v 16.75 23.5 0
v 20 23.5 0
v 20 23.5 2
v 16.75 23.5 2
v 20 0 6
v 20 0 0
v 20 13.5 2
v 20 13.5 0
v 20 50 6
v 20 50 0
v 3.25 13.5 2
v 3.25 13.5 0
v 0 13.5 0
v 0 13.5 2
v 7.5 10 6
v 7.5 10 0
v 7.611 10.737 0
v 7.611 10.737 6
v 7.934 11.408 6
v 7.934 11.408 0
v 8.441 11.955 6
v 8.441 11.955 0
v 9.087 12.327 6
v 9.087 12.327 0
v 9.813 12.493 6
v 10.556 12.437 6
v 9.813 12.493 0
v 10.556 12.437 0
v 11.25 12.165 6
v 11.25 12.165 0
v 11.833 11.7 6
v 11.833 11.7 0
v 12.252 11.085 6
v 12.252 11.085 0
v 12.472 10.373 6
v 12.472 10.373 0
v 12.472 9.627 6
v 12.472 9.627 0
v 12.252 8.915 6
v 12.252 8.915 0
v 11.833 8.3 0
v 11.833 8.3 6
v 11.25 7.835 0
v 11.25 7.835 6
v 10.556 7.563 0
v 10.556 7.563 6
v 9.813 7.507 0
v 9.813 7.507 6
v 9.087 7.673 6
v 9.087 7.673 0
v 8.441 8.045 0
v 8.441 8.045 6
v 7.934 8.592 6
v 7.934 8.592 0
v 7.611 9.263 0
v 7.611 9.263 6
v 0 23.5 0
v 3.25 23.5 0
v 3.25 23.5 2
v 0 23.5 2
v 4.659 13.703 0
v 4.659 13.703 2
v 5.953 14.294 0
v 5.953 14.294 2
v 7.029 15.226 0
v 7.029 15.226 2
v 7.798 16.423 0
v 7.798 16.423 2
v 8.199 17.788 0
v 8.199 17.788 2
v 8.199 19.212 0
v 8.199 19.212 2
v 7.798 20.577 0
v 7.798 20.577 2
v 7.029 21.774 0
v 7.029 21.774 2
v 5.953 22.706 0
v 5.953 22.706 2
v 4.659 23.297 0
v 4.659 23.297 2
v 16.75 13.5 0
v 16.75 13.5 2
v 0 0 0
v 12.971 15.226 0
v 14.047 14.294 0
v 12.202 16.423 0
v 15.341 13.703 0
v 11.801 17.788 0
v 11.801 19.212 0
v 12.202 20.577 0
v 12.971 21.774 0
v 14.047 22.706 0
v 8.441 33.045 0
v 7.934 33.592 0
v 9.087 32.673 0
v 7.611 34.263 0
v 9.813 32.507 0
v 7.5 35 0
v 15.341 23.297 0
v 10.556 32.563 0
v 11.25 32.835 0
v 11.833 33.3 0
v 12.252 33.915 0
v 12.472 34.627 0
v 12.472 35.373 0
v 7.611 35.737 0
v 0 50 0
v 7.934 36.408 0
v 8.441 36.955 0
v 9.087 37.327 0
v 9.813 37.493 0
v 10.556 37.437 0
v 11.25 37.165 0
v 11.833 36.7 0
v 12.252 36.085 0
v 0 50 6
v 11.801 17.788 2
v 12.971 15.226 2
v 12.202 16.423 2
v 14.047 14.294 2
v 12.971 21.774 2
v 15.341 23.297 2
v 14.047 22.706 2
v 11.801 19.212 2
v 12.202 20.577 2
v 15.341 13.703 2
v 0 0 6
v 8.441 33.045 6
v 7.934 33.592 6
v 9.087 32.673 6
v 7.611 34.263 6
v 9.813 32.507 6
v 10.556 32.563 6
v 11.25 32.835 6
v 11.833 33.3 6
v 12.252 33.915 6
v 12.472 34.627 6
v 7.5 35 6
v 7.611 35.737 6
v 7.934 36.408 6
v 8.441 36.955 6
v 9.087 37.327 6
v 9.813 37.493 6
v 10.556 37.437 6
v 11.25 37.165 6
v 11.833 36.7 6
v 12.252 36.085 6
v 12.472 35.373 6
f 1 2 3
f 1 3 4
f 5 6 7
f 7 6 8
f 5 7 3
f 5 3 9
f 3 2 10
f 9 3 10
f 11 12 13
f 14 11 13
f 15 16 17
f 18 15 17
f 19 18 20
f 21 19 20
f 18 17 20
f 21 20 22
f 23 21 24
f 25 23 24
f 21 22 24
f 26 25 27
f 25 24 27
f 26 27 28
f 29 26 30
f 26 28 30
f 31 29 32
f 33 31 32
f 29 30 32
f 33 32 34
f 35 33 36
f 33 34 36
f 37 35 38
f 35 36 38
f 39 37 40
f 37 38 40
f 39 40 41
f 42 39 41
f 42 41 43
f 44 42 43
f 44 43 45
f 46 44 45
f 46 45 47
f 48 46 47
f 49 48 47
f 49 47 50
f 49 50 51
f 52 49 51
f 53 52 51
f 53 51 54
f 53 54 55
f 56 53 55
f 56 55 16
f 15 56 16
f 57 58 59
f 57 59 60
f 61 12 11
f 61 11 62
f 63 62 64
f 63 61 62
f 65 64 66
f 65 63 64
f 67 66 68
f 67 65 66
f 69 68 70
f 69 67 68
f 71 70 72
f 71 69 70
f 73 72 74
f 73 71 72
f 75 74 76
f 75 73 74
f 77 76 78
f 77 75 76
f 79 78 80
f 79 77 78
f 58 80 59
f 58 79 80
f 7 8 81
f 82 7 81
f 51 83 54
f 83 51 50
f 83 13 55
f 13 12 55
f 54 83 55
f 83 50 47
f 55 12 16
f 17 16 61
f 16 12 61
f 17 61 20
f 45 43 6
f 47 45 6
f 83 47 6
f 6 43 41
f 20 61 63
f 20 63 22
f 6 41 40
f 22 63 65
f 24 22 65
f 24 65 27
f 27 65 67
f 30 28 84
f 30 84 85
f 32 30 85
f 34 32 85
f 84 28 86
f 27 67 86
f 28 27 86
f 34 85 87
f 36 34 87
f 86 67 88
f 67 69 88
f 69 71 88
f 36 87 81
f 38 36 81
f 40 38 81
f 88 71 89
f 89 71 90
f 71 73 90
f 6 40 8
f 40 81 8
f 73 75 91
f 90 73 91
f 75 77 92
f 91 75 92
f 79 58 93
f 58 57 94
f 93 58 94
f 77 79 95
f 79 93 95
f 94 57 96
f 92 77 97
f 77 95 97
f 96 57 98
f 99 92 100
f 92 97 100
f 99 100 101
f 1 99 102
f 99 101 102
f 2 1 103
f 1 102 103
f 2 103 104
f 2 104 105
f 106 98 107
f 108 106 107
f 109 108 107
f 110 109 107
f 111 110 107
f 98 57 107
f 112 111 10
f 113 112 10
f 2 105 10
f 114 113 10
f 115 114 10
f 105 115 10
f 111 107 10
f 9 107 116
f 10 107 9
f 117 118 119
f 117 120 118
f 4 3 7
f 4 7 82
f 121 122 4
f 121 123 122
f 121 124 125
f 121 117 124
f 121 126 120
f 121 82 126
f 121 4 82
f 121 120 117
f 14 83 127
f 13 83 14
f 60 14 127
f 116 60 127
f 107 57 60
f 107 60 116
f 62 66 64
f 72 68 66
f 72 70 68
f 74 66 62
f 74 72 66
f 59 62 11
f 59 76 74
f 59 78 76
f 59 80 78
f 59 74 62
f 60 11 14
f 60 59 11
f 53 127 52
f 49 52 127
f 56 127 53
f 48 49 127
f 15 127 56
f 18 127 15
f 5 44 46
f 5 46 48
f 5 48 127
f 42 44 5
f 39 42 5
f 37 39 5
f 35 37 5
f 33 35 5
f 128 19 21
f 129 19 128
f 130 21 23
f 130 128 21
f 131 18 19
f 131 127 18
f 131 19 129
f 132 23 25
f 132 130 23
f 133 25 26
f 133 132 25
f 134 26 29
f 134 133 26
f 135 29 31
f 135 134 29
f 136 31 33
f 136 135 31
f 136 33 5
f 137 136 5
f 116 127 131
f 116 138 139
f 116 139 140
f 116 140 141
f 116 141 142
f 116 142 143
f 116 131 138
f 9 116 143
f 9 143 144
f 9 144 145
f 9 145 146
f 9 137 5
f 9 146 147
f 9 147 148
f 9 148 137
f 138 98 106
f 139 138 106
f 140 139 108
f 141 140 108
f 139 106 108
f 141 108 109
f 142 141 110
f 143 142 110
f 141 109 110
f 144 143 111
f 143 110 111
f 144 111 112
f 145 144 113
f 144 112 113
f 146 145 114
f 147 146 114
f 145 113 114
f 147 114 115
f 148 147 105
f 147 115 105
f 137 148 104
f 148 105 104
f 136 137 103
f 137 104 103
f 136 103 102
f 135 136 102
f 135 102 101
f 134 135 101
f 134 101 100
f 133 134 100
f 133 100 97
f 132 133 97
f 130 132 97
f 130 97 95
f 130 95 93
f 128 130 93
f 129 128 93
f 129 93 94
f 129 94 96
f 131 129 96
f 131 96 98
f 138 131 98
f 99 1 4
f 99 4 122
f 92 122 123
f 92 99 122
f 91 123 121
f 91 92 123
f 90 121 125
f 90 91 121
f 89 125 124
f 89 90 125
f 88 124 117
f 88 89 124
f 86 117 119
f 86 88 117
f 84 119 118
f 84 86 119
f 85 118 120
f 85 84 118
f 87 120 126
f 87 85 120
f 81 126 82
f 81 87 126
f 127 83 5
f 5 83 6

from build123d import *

# Parameters (mm, degrees)
ESBO_O1_W                = 20
ESBO_O1_H                = 50
RESSALTO_EXTRUS_O1_DEPTH = 6
ESBO_O2_R                = 2.5
CORTE_EXTRUS_O1_DEPTH    = 10
ESBO_O3_R                = 5
CORTE_EXTRUS_O2_DEPTH    = 2
ESBO_O4_W                = 3.25
ESBO_O4_H                = 10
CORTE_EXTRUS_O3_DEPTH    = 2
ESBO_O5_R                = 2.5
RESSALTO_EXTRUS_O2_DEPTH = 4


with BuildPart() as part:
    # Esboço1 → Ressalto-extrusão1 (new body)
    with BuildSketch(Plane.XY):
        with Locations((10, 25)):
            Rectangle(ESBO_O1_W, ESBO_O1_H)
    extrude(amount=RESSALTO_EXTRUS_O1_DEPTH)

    # Esboço2 → Corte-extrusão1 (cut)
    with BuildSketch(Plane(origin=(0, 0, 0), x_dir=(-1, 0, 0), z_dir=(0, 0, -1))):
        with Locations((-10, 35)):
            Circle(ESBO_O2_R)
        with Locations((-3.25, 18.5)):
            Circle(ESBO_O2_R)
        with Locations((-10, 10)):
            Circle(ESBO_O2_R)
    extrude(amount=-CORTE_EXTRUS_O1_DEPTH, mode=Mode.SUBTRACT)

    # Esboço3 → Corte-extrusão2 (cut)
    with BuildSketch(Plane.XY):
        with Locations((3.25, 18.5)):
            Circle(ESBO_O3_R)
        with Locations((16.75, 18.5)):
            Circle(ESBO_O3_R)
    extrude(amount=CORTE_EXTRUS_O2_DEPTH, mode=Mode.SUBTRACT)

    # Esboço4 → Corte-extrusão3 (cut)
    with BuildSketch(Plane(origin=(0, 0, 0), x_dir=(-1, 0, 0), z_dir=(0, 0, -1))):
        with Locations((-1.625, 18.5)):
            Rectangle(ESBO_O4_W, ESBO_O4_H)
        with Locations((-18.375, 18.5)):
            Rectangle(ESBO_O4_W, ESBO_O4_H)
    extrude(amount=-CORTE_EXTRUS_O3_DEPTH, mode=Mode.SUBTRACT)

    # Esboço5 → Ressalto-extrusão2 (add)
    with BuildSketch(Plane.XY.offset(6)):
        with Locations((3.25, 18.5)):
            Circle(ESBO_O5_R)
    extrude(amount=-RESSALTO_EXTRUS_O2_DEPTH)


solid = part.part
